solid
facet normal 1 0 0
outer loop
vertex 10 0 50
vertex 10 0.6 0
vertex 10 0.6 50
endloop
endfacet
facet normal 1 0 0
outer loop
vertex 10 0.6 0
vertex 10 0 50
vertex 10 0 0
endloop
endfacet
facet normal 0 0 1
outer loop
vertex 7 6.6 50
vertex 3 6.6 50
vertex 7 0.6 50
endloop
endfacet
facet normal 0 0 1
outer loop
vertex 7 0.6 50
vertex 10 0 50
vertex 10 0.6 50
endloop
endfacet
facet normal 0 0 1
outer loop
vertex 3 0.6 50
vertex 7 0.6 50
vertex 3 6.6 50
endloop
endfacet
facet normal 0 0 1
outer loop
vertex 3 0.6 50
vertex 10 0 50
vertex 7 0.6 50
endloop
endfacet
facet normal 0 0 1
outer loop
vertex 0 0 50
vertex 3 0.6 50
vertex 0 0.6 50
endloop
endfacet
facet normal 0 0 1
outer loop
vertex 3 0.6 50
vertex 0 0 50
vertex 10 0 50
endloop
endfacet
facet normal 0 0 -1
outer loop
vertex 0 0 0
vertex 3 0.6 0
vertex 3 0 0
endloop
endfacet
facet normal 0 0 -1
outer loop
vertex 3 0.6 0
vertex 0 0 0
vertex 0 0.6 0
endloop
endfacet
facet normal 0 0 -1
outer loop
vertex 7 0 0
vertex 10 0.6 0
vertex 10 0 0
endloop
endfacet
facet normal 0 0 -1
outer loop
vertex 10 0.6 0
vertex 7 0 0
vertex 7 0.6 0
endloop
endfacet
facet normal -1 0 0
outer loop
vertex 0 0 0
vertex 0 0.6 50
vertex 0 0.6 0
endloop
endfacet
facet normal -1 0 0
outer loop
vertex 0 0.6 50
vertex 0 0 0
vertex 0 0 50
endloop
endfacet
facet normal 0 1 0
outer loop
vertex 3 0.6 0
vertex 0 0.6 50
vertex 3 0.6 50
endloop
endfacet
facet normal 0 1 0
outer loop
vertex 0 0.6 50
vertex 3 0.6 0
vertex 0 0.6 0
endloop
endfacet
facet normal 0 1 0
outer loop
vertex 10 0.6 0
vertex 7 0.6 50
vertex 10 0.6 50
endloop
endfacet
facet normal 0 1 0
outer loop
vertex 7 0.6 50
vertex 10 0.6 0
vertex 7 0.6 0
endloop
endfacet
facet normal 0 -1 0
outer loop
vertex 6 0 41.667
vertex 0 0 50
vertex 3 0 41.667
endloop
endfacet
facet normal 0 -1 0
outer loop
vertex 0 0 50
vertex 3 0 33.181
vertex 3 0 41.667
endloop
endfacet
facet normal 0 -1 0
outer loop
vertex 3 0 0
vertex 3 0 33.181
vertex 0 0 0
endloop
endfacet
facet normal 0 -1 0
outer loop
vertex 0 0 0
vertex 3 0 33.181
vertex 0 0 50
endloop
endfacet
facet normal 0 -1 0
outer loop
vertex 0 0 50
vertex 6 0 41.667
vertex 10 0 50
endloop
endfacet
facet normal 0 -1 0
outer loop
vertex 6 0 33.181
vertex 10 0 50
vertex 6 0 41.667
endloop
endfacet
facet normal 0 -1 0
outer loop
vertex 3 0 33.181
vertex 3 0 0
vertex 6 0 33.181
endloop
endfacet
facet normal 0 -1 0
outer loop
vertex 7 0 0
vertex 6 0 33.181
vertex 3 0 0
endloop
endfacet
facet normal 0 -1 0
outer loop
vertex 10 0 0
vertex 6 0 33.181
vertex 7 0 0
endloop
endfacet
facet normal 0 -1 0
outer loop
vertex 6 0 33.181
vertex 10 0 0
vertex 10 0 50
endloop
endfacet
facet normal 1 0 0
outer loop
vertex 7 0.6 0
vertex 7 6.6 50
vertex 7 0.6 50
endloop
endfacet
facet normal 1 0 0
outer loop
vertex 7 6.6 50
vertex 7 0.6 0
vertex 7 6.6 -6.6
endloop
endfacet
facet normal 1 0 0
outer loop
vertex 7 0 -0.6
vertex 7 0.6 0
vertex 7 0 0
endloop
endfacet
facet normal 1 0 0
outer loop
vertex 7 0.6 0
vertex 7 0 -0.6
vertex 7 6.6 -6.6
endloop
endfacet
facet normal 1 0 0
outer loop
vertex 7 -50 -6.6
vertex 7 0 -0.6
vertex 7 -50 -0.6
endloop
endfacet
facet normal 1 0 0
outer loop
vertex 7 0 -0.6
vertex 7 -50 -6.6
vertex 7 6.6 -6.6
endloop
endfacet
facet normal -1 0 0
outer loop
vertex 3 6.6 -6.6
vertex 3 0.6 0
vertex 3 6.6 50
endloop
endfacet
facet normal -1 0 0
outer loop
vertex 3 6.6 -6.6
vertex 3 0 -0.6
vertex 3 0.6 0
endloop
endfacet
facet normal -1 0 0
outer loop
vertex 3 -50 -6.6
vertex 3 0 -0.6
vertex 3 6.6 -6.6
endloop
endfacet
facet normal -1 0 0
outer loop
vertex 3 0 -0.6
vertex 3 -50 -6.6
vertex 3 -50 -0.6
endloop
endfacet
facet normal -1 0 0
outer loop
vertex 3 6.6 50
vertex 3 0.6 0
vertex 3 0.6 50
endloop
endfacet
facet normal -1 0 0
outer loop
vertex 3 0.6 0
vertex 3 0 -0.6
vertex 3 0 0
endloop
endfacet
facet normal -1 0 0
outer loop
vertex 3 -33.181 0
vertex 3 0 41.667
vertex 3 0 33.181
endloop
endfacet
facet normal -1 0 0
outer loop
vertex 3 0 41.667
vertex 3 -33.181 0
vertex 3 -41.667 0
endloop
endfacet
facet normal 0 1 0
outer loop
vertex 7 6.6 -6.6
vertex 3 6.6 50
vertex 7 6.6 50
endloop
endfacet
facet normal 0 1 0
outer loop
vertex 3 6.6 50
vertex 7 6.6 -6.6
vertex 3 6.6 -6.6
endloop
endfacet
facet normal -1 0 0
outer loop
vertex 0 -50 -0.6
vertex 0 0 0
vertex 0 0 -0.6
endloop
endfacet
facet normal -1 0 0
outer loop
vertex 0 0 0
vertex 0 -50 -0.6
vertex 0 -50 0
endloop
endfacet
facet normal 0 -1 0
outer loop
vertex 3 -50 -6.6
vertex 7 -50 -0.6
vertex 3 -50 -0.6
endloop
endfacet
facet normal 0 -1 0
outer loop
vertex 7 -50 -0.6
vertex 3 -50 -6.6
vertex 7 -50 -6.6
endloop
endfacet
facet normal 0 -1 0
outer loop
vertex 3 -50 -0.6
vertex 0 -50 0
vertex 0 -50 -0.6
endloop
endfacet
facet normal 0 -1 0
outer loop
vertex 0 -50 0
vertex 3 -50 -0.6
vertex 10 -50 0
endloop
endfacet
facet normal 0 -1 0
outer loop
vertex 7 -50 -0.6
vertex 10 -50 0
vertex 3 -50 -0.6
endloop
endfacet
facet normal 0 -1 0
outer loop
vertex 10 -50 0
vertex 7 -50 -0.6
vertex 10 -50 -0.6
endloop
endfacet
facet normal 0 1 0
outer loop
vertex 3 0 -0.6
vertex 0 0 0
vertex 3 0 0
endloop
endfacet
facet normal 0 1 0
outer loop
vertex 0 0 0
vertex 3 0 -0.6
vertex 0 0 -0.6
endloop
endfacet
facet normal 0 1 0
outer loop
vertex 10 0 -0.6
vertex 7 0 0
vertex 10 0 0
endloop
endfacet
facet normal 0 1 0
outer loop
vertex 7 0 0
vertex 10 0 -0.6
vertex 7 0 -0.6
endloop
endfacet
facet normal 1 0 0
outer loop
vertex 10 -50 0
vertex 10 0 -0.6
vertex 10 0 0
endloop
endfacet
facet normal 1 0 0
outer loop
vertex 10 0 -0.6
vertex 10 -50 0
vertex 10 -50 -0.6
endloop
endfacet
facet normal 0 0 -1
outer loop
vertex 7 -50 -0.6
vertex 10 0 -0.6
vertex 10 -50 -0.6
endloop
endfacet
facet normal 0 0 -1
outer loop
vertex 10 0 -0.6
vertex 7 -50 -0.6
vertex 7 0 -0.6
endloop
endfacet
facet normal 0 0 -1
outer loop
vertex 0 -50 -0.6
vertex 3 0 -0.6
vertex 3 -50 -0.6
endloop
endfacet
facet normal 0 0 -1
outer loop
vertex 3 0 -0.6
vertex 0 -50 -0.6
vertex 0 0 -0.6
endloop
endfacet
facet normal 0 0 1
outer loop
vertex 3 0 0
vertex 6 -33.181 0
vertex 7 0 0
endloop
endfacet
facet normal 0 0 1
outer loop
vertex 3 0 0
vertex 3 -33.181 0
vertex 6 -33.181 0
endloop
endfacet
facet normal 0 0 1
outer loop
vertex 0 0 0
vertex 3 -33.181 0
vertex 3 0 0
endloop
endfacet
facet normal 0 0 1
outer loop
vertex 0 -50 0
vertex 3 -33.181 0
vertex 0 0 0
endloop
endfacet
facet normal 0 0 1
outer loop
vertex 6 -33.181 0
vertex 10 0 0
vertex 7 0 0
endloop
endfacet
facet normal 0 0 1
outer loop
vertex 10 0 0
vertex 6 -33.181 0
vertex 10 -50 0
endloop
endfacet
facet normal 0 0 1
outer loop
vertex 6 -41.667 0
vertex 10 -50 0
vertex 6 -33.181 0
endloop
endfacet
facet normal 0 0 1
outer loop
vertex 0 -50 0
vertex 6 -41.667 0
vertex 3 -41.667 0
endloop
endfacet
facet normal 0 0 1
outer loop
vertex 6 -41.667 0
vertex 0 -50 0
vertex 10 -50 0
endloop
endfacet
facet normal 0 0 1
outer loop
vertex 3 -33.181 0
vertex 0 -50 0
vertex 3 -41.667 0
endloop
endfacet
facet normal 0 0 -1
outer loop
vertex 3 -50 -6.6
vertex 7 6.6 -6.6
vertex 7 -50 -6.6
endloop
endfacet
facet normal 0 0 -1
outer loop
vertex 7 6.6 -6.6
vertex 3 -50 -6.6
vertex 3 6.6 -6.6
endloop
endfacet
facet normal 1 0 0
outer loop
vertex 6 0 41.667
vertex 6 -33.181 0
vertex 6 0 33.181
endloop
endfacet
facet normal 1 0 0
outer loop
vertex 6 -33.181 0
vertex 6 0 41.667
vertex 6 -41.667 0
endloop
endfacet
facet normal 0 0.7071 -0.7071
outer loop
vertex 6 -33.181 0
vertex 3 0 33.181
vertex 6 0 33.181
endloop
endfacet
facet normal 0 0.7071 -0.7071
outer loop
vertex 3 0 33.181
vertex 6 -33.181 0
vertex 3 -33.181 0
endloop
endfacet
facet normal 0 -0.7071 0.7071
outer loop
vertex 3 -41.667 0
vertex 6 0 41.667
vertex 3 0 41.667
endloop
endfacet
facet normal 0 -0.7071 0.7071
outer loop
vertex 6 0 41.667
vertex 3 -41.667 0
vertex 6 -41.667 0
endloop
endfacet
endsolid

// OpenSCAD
// Parameters
horizontal_width = 10;
horizontal_thickness = 0.6;
vertical_thickness = 4;
vertical_height = 6;
length = 50;

module profile_T_inverted(len) {
    union() {
        // Horizontal bar (flat)
        cube([horizontal_width, horizontal_thickness, length]);

        // Vertical stem that "rises", centered on the width
        translate([
            (horizontal_width - vertical_thickness)/2,
            horizontal_thickness,
            0
        ])
        cube([vertical_thickness, vertical_height, length]);
    }
}


module gap(len) {
    union() {
        translate([(horizontal_width - vertical_thickness)/2,horizontal_thickness-horizontal_thickness, -vertical_height-horizontal_thickness])
            cube([vertical_thickness, vertical_height+horizontal_thickness, vertical_height+horizontal_thickness]);

    }
}

module reinforcement(len) {
    small_len = len / 6 * 5;
    thickness = (horizontal_width - vertical_thickness)/2;
    union() {
        translate([thickness, 0, 0])
        translate([0, -small_len, 0])
        rotate([-45, 0, 0])
        cube([thickness, vertical_height, sqrt(small_len^2 * 2)]);
    }
}

module corner_with_bevel() {
    intersection() {
        union() {
            // First T
            profile_T_inverted(length);

            // Fill the gap
            gap(length);
            
            // Second T, rotated by 90 degrees
            rotate([90, 180, 0])
            translate([-horizontal_width, 0, 0])
                profile_T_inverted(length);

            // Bar between the Ts
            reinforcement(length);
        }
    }
}

// Display
corner_with_bevel();
